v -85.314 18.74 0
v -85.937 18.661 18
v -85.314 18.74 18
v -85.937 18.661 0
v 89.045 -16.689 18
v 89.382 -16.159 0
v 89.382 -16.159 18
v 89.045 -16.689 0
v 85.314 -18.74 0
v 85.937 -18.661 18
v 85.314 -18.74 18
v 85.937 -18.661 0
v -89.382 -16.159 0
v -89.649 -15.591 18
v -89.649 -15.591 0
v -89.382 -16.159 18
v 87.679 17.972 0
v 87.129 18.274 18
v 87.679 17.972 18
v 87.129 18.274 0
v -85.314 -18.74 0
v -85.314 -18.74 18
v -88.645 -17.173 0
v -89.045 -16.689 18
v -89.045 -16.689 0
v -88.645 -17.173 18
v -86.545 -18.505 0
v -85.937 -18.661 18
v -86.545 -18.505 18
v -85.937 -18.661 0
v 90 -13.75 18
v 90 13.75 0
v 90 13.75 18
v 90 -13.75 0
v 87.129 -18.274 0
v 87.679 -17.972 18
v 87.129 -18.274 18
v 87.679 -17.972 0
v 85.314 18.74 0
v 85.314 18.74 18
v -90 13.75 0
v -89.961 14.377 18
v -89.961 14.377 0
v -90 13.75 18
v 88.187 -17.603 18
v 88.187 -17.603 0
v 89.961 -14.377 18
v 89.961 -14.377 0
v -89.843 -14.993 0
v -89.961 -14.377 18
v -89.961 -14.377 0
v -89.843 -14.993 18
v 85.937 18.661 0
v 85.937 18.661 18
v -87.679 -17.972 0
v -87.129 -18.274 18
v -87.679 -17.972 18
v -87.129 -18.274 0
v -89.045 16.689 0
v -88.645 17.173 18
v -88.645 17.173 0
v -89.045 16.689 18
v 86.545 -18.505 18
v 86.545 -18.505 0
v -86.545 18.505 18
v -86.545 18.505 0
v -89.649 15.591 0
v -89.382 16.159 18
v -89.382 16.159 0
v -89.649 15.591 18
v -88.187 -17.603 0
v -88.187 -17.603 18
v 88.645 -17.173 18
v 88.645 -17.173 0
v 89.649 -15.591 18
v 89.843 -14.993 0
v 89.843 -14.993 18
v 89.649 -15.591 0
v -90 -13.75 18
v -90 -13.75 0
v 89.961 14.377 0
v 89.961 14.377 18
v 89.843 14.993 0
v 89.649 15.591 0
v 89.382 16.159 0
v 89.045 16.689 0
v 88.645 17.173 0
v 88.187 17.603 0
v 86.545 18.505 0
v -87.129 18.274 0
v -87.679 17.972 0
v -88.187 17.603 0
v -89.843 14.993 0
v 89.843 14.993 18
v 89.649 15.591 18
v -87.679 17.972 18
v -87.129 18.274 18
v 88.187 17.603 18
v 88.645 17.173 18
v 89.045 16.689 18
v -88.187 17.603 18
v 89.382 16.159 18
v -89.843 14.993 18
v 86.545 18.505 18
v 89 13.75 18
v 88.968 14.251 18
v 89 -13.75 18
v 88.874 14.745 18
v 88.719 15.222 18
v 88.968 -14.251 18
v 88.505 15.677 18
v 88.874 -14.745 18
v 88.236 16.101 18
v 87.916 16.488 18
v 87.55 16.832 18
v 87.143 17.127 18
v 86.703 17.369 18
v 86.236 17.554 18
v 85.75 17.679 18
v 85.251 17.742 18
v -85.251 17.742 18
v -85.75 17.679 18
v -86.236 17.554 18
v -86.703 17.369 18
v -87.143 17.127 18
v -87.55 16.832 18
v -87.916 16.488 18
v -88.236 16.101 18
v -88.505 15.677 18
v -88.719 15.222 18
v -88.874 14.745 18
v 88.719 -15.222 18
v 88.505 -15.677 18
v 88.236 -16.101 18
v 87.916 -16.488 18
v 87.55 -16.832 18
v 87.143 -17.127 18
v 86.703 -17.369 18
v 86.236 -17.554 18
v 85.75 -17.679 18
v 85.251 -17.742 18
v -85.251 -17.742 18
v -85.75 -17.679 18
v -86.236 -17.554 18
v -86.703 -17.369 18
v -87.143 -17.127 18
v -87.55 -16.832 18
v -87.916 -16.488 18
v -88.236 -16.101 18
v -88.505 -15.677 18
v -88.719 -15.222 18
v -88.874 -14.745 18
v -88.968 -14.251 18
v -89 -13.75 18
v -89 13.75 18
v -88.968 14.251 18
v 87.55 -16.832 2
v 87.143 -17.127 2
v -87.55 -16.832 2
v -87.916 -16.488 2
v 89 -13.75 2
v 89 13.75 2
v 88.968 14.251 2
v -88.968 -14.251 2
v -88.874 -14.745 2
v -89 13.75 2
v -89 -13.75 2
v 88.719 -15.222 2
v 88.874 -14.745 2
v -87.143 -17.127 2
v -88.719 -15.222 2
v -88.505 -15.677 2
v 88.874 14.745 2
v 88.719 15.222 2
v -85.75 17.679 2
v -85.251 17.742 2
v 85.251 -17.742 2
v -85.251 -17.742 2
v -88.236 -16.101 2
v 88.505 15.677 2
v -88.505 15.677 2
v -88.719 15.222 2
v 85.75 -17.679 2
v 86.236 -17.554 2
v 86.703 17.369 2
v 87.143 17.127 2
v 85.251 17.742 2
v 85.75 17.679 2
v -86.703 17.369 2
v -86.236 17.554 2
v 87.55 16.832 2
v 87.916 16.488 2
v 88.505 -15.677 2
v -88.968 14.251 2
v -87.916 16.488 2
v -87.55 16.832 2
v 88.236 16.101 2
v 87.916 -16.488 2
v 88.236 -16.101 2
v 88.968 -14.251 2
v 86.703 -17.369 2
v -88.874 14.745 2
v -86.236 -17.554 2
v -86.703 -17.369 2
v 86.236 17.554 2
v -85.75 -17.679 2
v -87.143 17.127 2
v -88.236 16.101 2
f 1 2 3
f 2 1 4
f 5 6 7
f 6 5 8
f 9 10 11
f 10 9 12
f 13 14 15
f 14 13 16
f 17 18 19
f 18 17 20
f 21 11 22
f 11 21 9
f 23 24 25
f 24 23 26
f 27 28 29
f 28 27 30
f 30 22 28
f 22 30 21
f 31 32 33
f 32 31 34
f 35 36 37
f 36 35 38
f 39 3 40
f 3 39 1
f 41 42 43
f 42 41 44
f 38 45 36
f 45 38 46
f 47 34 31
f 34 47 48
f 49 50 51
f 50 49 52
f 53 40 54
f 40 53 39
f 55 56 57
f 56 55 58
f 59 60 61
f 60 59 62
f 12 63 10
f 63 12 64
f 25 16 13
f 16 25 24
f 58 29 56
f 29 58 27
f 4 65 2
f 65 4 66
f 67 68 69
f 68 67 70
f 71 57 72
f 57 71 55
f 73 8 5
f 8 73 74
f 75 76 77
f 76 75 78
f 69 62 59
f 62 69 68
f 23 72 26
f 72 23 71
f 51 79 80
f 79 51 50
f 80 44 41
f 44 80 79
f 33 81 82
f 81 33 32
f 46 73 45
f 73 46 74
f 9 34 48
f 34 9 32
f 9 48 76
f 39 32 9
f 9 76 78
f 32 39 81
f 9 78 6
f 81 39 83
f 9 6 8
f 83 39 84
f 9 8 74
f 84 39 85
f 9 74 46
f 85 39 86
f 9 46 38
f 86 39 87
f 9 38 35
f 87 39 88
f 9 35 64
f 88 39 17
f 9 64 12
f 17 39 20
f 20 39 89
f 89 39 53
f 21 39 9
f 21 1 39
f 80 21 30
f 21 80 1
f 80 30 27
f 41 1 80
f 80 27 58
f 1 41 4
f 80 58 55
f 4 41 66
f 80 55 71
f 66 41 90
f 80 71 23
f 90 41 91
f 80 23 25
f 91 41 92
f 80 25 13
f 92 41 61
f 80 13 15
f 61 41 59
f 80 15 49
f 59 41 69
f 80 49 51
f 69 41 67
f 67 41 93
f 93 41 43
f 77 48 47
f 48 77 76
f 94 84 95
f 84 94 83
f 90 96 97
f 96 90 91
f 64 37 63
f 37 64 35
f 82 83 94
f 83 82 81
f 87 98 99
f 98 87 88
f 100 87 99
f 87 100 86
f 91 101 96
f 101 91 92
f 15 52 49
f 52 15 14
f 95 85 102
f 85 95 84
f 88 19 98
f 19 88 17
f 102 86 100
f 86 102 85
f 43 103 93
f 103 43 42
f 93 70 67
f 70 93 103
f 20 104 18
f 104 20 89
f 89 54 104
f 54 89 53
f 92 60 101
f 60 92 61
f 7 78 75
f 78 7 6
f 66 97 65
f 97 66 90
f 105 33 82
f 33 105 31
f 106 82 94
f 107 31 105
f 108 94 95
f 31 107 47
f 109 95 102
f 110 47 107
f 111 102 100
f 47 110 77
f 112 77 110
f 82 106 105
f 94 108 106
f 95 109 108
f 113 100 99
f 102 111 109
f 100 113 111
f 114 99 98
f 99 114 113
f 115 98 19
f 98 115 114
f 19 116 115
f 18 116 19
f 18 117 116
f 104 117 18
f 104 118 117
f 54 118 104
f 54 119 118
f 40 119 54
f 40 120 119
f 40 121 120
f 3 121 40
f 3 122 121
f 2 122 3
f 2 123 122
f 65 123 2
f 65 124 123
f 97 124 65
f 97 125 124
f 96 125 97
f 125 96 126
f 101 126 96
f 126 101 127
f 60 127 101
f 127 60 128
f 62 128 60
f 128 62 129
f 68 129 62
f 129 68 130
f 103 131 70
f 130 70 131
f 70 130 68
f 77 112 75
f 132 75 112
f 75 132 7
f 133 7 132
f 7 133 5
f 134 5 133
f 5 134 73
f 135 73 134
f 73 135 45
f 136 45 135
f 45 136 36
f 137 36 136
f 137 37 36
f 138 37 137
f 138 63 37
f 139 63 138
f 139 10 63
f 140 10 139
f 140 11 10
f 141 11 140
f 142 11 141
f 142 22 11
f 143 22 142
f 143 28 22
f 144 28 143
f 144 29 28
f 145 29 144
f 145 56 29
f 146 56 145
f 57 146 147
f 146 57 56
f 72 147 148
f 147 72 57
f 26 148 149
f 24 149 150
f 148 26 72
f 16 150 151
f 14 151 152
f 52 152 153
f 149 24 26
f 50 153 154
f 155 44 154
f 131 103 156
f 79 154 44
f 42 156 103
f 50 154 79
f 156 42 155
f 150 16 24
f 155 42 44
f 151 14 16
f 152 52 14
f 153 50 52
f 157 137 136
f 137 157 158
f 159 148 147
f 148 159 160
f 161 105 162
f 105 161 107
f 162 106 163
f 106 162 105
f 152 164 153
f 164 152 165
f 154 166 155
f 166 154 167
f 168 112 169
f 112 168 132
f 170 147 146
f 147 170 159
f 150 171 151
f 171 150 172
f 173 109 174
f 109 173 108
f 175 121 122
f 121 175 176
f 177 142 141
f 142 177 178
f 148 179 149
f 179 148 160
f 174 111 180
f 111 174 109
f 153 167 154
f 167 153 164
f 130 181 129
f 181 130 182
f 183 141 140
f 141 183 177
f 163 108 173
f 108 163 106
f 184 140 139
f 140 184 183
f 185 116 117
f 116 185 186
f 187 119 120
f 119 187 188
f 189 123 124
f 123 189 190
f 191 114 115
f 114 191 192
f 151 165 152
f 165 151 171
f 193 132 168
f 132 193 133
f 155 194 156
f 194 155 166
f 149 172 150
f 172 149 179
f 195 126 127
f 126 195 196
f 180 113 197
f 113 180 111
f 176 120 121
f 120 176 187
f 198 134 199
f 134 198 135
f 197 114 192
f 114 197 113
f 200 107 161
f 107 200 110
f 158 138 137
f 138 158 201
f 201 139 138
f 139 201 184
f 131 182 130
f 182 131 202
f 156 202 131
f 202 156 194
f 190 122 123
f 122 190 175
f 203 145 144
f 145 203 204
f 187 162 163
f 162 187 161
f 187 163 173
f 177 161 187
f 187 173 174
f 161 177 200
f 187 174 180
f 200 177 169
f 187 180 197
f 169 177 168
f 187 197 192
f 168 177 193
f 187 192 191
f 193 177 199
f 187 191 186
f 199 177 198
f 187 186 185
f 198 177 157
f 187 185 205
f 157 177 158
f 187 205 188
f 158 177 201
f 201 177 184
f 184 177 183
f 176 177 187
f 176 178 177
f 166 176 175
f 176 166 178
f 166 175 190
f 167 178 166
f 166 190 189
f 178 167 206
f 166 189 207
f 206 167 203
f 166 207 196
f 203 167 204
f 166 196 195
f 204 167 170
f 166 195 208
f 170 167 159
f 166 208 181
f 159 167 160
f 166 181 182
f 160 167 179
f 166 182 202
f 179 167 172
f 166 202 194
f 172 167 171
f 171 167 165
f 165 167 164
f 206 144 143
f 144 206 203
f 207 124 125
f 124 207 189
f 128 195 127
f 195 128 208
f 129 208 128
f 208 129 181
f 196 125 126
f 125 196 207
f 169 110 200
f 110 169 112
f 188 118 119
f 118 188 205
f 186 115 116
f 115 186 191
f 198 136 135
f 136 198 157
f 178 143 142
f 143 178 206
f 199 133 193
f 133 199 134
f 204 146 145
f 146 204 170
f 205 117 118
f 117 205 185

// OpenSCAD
$fn = 50;


difference() {
	union() {
		hull() {
			translate(v = [-85.0000000000, 13.7500000000, 0]) {
				cylinder(h = 18, r = 5);
			}
			translate(v = [85.0000000000, 13.7500000000, 0]) {
				cylinder(h = 18, r = 5);
			}
			translate(v = [-85.0000000000, -13.7500000000, 0]) {
				cylinder(h = 18, r = 5);
			}
			translate(v = [85.0000000000, -13.7500000000, 0]) {
				cylinder(h = 18, r = 5);
			}
		}
	}
	union() {
		translate(v = [0, 0, 2]) {
			hull() {
				translate(v = [-85.0000000000, 13.7500000000, 0]) {
					cylinder(h = 16, r = 4);
				}
				translate(v = [85.0000000000, 13.7500000000, 0]) {
					cylinder(h = 16, r = 4);
				}
				translate(v = [-85.0000000000, -13.7500000000, 0]) {
					cylinder(h = 16, r = 4);
				}
				translate(v = [85.0000000000, -13.7500000000, 0]) {
					cylinder(h = 16, r = 4);
				}
			}
		}
	}
}
